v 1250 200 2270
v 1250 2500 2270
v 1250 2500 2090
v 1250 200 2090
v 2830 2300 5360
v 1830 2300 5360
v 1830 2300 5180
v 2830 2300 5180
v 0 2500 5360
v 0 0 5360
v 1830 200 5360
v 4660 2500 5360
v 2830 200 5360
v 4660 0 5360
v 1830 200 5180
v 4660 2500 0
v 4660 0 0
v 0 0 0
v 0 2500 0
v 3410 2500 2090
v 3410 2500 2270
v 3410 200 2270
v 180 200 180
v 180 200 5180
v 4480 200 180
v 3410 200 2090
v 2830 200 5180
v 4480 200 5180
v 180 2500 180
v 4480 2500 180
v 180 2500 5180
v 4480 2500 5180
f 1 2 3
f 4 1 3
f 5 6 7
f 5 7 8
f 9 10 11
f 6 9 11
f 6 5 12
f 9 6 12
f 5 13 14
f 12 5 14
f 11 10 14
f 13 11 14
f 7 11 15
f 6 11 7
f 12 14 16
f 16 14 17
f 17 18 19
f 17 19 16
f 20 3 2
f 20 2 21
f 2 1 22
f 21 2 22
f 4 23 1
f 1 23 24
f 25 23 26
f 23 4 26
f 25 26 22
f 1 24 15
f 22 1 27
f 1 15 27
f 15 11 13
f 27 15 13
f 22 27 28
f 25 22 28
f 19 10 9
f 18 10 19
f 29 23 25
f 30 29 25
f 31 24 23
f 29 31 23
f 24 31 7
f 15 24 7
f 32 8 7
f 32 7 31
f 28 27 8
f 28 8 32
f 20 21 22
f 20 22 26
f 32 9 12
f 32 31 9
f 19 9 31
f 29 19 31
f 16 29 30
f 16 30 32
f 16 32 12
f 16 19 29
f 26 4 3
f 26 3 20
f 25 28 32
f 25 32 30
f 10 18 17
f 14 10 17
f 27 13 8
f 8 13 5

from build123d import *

# Parameters (mm, degrees)
CROQUIS1_W              = 4660
CROQUIS1_H              = 5360
SALIENTE_EXTRUIR1_DEPTH = 200
CROQUIS2_W              = 4660
CROQUIS2_H              = 5360
CROQUIS2_W_2            = 4300
CROQUIS2_H_2            = 5000
CROQUIS2_W_3            = 2160
CROQUIS2_H_3            = 180
SALIENTE_EXTRUIR2_DEPTH = 2300
CROQUIS3_W              = 1000
CROQUIS3_H              = 2100
CORTAR_EXTRUIR1_DEPTH   = 180


with BuildPart() as part:
    # Croquis1 → Saliente-Extruir1 (new body)
    with BuildSketch(Plane(origin=(0, 0, 0), x_dir=(1, 0, 0), z_dir=(0, 1, 0))):
        with Locations((2330, -2680)):
            Rectangle(CROQUIS1_W, CROQUIS1_H)
    extrude(amount=SALIENTE_EXTRUIR1_DEPTH)

    # Croquis2 → Saliente-Extruir2 (add)
    with BuildSketch(Plane(origin=(0, 200, 0), x_dir=(1, 0, 0), z_dir=(0, 1, 0))):
        with Locations((2330, -2680)):
            Rectangle(CROQUIS2_W, CROQUIS2_H)
        with Locations((2330, -2680)):
            Rectangle(CROQUIS2_W_2, CROQUIS2_H_2, mode=Mode.SUBTRACT)
        with Locations((2330, -2180)):
            Rectangle(CROQUIS2_W_3, CROQUIS2_H_3)
    extrude(amount=SALIENTE_EXTRUIR2_DEPTH)

    # Croquis3 → Cortar-Extruir1 (cut)
    with BuildSketch(Plane.XY.offset(5360)):
        with Locations((2330, 1250)):
            Rectangle(CROQUIS3_W, CROQUIS3_H)
    extrude(amount=-CORTAR_EXTRUIR1_DEPTH, mode=Mode.SUBTRACT)


solid = part.part
